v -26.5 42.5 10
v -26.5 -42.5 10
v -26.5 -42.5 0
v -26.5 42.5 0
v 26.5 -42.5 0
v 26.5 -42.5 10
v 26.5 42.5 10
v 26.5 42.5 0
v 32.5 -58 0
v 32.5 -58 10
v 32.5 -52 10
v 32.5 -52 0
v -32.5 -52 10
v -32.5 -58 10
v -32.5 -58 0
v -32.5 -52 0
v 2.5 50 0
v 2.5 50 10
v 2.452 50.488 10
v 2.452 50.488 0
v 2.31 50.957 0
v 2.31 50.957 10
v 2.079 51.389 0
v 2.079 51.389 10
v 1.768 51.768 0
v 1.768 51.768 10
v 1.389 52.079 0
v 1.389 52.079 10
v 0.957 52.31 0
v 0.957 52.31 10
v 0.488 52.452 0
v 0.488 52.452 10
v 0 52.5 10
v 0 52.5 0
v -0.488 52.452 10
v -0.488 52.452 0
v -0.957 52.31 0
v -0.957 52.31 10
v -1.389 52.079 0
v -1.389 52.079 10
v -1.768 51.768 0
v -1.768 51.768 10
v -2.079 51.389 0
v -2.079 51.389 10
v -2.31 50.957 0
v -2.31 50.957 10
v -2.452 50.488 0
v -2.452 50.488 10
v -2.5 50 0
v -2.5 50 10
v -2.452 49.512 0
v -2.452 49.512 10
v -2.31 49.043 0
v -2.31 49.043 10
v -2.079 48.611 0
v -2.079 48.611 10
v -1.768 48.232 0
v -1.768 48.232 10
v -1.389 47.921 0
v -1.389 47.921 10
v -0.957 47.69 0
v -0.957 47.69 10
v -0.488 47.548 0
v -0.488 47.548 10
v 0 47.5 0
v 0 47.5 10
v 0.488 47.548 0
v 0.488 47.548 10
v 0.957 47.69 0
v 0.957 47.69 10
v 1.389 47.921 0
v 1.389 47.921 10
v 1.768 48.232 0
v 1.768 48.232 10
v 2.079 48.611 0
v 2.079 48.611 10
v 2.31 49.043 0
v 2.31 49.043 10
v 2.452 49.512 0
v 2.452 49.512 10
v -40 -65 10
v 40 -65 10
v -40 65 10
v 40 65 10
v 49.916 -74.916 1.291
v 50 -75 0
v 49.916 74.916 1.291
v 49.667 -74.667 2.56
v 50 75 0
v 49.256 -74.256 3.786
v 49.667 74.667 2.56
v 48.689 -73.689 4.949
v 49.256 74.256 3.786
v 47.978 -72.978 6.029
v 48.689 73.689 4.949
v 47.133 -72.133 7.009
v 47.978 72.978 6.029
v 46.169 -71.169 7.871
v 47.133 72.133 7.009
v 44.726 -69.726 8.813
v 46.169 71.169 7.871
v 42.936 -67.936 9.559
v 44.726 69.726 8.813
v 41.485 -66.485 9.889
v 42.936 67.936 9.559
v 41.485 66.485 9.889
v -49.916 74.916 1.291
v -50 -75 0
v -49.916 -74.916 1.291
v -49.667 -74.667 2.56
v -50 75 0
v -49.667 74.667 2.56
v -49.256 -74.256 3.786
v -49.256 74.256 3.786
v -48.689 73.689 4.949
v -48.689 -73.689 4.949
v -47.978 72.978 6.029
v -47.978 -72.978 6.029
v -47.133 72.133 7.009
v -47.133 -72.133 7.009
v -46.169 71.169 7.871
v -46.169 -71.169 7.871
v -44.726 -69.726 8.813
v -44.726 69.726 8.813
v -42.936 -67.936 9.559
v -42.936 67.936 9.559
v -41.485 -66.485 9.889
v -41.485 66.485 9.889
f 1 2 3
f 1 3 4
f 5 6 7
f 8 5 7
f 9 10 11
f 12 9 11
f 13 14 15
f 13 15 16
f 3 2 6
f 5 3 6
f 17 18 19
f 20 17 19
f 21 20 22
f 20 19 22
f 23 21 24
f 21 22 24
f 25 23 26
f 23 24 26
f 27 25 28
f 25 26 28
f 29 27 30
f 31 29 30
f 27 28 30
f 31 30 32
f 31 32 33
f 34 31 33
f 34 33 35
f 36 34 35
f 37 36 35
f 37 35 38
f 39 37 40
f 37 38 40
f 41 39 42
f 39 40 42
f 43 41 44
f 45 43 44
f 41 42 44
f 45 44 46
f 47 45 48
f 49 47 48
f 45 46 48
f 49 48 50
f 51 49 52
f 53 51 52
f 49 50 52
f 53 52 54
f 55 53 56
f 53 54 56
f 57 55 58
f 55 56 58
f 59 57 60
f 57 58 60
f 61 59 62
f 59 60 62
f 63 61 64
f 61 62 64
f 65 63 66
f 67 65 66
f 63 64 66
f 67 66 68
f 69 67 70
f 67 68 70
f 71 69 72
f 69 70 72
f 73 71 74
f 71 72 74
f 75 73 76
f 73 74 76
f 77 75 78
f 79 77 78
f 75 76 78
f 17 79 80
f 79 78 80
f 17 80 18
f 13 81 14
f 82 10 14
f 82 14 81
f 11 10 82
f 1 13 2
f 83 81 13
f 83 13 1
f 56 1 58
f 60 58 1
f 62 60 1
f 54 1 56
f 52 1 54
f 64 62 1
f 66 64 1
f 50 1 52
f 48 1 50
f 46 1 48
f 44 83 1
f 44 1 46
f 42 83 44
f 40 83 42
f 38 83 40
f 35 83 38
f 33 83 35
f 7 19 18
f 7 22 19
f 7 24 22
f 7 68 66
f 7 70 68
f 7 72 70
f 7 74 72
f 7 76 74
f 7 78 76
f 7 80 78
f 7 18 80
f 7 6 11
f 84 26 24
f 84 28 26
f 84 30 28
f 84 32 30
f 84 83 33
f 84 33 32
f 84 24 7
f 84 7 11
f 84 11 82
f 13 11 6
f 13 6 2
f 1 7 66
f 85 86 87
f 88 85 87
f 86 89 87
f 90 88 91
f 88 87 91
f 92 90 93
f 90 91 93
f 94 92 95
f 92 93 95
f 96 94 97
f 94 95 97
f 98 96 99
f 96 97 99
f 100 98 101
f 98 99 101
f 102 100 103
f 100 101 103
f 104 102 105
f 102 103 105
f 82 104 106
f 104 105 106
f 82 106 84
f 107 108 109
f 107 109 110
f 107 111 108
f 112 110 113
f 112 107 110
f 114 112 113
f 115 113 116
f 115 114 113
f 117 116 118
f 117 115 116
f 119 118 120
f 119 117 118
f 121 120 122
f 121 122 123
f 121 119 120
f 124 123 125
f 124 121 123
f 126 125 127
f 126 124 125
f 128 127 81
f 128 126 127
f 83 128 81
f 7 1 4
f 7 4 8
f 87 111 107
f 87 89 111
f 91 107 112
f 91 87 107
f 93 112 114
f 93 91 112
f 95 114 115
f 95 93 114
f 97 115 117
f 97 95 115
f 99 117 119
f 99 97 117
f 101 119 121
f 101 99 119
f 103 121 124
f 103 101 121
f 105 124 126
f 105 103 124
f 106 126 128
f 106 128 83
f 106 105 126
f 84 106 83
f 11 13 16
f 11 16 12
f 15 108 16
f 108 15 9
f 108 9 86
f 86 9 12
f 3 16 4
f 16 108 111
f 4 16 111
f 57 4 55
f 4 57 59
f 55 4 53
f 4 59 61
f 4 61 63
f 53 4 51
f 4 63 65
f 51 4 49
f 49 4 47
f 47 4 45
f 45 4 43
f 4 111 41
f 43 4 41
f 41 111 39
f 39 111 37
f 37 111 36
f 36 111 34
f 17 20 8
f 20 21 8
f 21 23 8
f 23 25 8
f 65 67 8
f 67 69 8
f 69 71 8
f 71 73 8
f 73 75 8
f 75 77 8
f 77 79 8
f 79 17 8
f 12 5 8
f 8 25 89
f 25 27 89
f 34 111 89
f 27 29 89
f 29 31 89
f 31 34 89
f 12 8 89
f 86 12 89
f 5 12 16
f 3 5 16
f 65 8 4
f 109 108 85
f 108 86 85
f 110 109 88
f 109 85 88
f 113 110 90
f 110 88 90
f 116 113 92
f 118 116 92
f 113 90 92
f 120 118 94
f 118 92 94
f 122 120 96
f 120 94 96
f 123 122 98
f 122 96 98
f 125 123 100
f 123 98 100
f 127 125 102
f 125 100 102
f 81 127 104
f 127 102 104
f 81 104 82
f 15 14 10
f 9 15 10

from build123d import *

# Parameters (mm, degrees)
SKETCH2_W           = 100
SKETCH2_H           = 150
BOSS_EXTRUDE1_DEPTH = 10
FILLET1_R           = 10
SKETCH3_R           = 2.5
CUT_EXTRUDE1_DEPTH  = 10
SKETCH4_W           = 53
SKETCH4_H           = 85
CUT_EXTRUDE2_DEPTH  = 10
SKETCH5_W           = 65
SKETCH5_H           = 6
CUT_EXTRUDE3_DEPTH  = 10


with BuildPart() as part:
    # Sketch2 → Boss-Extrude1 (new body)
    with BuildSketch(Plane.XY):
        Rectangle(SKETCH2_W, SKETCH2_H)
    extrude(amount=BOSS_EXTRUDE1_DEPTH)

    # Fillet1
    fillet1_edges = [part.edges().sort_by_distance(p)[0] for p in [
        (50, 0, 10),
        (0, 75, 10),
        (-50, 0, 10),
        (0, -75, 10),
    ]]
    fillet(fillet1_edges, radius=FILLET1_R - 0.0001)  # a hair under: the kernel refuses the full size

    # Sketch3 → Cut-Extrude1 (cut)
    with BuildSketch(Plane.XY.offset(10)):
        with Locations((0, 50)):
            Circle(SKETCH3_R)
    extrude(amount=-CUT_EXTRUDE1_DEPTH, mode=Mode.SUBTRACT)

    # Sketch4 → Cut-Extrude2 (cut)
    with BuildSketch(Plane.XY.offset(10)):
        Rectangle(SKETCH4_W, SKETCH4_H)
    extrude(amount=-CUT_EXTRUDE2_DEPTH, mode=Mode.SUBTRACT)

    # Sketch5 → Cut-Extrude3 (cut)
    with BuildSketch(Plane.XY.offset(10)):
        with Locations((0, -55)):
            Rectangle(SKETCH5_W, SKETCH5_H)
    extrude(amount=-CUT_EXTRUDE3_DEPTH, mode=Mode.SUBTRACT)


solid = part.part
